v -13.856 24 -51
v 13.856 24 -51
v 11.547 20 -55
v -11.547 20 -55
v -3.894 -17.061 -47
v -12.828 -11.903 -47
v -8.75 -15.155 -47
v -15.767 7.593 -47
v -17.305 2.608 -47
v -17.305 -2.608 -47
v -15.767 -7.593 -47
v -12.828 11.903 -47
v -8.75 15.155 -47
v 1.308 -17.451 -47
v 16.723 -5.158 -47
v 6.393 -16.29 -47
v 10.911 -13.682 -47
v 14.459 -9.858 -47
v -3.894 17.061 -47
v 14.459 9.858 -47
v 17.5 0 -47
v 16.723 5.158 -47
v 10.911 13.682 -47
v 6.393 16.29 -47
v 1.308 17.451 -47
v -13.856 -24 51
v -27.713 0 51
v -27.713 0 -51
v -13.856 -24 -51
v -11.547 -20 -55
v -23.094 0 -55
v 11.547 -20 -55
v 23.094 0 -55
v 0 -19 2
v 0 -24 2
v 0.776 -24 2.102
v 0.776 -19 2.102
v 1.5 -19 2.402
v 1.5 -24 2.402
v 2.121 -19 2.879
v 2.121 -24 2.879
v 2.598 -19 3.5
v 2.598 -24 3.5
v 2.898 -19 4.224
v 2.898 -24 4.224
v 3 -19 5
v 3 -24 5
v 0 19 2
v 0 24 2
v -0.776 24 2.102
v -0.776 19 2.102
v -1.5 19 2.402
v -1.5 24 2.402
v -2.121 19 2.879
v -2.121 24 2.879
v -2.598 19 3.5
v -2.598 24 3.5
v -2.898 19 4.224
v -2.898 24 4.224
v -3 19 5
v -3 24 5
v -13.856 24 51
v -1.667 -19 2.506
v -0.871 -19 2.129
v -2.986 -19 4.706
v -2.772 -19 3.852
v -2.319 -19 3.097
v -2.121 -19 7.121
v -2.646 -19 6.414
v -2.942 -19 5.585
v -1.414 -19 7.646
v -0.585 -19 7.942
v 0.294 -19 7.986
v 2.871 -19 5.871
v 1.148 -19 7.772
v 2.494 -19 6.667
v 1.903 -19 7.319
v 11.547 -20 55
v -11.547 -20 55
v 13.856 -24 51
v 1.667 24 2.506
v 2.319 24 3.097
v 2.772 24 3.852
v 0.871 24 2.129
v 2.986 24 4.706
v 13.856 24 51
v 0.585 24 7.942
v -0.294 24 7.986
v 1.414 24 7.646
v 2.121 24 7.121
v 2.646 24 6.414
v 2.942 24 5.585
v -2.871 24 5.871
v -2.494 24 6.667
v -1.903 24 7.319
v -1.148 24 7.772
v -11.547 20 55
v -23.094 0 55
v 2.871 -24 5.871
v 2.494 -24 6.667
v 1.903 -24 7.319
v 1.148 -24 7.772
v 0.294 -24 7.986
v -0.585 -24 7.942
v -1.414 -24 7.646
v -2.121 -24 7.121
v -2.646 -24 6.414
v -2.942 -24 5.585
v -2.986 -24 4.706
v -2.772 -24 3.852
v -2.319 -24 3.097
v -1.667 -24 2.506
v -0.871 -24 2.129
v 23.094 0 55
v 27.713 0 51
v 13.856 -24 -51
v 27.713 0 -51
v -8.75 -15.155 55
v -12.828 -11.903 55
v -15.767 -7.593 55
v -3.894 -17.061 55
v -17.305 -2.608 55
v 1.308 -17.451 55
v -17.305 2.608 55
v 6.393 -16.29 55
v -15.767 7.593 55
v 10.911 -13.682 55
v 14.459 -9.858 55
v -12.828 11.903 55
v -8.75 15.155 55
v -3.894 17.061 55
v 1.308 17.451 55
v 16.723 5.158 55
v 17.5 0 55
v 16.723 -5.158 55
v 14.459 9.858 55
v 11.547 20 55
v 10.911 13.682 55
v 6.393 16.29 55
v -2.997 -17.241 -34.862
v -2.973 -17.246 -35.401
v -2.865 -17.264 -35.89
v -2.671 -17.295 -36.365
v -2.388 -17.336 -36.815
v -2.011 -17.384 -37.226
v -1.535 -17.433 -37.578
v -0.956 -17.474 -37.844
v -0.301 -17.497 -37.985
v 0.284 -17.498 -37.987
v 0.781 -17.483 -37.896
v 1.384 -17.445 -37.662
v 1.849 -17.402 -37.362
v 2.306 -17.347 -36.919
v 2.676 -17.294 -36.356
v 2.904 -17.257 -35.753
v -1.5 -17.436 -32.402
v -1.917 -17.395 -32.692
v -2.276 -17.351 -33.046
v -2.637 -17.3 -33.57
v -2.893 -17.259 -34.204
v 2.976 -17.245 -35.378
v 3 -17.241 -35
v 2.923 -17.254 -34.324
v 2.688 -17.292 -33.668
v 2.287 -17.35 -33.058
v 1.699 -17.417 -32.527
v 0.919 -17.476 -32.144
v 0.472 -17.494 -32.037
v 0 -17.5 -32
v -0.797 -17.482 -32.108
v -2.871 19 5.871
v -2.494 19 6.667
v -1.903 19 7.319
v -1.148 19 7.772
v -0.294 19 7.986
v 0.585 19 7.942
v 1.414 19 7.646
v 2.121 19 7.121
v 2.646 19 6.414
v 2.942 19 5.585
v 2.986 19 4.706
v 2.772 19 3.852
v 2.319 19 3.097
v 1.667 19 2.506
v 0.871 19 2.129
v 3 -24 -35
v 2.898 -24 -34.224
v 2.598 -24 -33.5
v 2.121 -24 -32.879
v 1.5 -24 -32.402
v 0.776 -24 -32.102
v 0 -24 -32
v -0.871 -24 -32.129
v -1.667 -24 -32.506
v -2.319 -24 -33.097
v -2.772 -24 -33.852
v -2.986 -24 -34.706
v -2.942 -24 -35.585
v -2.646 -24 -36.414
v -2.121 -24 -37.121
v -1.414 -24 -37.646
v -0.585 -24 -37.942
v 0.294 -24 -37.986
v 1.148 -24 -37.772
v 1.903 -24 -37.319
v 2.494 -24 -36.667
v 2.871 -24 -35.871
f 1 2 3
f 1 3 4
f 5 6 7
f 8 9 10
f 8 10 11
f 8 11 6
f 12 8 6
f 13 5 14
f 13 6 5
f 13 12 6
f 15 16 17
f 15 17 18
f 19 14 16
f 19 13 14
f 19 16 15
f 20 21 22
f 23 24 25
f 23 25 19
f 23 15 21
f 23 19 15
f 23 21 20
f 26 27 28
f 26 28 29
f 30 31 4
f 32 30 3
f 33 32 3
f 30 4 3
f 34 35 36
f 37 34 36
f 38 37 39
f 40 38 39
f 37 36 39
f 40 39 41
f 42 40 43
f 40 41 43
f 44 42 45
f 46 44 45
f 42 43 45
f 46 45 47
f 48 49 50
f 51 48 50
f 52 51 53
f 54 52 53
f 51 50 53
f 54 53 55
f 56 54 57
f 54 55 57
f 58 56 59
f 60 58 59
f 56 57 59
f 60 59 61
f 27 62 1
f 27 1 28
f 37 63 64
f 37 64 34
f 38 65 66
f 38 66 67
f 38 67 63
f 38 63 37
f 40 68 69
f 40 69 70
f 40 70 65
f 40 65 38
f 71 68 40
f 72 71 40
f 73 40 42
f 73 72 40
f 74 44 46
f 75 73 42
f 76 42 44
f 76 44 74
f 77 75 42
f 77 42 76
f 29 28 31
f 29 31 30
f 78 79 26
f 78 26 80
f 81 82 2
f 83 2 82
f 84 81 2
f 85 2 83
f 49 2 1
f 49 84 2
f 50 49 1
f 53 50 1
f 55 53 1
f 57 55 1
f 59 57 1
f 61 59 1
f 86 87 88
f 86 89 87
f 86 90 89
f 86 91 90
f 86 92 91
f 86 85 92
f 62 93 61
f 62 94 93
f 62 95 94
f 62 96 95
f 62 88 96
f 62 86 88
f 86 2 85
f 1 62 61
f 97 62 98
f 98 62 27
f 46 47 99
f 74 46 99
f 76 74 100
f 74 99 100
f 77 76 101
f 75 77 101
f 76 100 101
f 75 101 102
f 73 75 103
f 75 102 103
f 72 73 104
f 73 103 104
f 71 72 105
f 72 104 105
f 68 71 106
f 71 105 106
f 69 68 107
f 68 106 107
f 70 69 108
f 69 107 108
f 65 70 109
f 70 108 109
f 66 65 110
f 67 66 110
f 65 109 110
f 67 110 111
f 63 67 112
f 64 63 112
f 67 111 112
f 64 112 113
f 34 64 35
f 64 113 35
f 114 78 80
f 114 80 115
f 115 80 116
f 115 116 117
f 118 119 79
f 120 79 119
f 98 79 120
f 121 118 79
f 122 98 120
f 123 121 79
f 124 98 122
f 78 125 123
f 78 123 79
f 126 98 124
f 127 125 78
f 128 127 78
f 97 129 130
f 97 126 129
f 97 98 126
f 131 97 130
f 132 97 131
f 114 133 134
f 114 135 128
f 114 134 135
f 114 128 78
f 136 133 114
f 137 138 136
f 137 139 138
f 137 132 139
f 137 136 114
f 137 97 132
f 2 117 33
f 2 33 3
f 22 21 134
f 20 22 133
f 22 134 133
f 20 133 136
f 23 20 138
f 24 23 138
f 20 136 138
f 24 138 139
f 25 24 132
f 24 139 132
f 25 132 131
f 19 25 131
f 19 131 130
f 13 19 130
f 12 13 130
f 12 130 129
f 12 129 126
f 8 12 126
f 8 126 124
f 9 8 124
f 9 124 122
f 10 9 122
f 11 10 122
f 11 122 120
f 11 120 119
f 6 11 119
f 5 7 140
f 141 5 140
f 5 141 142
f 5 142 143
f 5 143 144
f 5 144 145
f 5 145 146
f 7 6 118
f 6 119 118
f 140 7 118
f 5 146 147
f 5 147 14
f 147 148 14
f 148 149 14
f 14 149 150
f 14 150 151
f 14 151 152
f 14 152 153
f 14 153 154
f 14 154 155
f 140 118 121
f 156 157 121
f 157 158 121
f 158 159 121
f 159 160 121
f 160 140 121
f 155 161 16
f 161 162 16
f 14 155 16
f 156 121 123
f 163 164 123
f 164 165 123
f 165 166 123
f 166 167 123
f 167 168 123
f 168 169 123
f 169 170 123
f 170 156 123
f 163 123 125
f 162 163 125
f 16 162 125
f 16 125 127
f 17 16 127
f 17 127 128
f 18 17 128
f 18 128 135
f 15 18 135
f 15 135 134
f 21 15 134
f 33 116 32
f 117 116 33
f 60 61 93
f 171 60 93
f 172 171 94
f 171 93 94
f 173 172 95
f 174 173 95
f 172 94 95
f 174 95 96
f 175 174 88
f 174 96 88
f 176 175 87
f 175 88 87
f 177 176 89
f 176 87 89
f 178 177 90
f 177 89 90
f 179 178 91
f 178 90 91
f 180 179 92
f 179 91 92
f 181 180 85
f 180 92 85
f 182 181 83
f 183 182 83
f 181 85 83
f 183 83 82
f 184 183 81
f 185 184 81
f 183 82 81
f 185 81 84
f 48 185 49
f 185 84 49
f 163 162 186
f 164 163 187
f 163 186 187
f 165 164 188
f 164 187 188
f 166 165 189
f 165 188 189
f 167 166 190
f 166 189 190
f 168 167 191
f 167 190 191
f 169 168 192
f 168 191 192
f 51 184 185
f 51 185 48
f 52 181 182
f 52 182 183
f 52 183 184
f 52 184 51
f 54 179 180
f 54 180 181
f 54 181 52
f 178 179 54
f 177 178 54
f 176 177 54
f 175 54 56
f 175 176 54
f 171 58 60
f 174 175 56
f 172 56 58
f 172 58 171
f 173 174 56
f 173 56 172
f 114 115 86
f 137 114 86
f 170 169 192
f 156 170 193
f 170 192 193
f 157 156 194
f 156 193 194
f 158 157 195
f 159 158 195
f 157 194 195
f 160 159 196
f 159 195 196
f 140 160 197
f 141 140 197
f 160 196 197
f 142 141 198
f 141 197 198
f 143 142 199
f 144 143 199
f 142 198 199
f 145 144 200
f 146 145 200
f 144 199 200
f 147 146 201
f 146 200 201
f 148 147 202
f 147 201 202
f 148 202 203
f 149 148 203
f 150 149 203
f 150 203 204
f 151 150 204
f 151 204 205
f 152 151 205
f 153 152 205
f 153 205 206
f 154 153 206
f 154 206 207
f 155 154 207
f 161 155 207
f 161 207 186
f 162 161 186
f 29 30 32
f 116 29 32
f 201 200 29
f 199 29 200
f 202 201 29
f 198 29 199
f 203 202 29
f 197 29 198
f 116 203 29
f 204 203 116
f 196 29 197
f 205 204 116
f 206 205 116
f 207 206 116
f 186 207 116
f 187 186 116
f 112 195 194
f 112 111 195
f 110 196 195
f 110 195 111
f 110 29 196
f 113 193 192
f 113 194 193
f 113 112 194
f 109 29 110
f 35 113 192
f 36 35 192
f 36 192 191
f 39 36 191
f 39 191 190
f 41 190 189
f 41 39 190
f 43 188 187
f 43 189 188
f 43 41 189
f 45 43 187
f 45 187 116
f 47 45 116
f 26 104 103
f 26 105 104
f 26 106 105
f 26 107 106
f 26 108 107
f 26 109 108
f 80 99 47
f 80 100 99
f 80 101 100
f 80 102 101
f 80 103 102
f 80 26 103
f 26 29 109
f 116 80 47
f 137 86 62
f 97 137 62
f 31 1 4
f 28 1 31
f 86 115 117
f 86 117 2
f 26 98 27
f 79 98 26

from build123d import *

# Parameters (mm, degrees)
F1_DEPTH = 55
F2_R     = 17.5
F3_DEPTH = 102
F5_DEPTH = 5
F7_DEPTH = 25
F9_DEPTH = 5
F10_SIZE = 4


with BuildPart() as f1:
    # F0 (on Top) → F1 (new body, symmetric)
    with BuildSketch(Plane.XY):
        Polygon((-13.856406, -24), (13.856406, -24), (27.712813, 0), (13.856406, 24), (-13.856406, 24), (-27.712813, 0), align=None)
    extrude(amount=F1_DEPTH, both=True)

    # F2 (on face) → F3 (cut)
    with BuildSketch(Plane.XY.offset(55)):
        Circle(F2_R)
    extrude(amount=-F3_DEPTH, mode=Mode.SUBTRACT)

    # F4 (on face) → F5 (cut)
    with BuildSketch(Plane(origin=(0, 24, 0), x_dir=(-1, 0, 0), z_dir=(0, 1, 0))):
        with BuildLine():
            ThreePointArc((0, 2), (2.12132, 2.87868), (3, 5))
            ThreePointArc((3, 5), (-2.12132, 7.12132), (0, 2))
        make_face()
    extrude(amount=-F5_DEPTH, mode=Mode.SUBTRACT)

    # F6 (on face) → F7 (cut)
    with BuildSketch(Plane.XZ.offset(24)):
        with BuildLine():
            ThreePointArc((3, -35), (2.12132, -32.87868), (0, -32))
            ThreePointArc((0, -32), (-2.12132, -37.12132), (3, -35))
        make_face()
        with BuildLine():
            ThreePointArc((0.502708, -35), (-0.355468, -35.355468), (0, -34.497292))
            ThreePointArc((0, -34.497292), (0.355468, -34.644532), (0.502708, -35))
        make_face(mode=Mode.SUBTRACT)
        with BuildLine():
            ThreePointArc((0.502708, -35), (0.355468, -34.644532), (0, -34.497292))
            ThreePointArc((0, -34.497292), (-0.355468, -35.355468), (0.502708, -35))
        make_face()
    extrude(amount=-F7_DEPTH, mode=Mode.SUBTRACT)

    # F8 (on face) → F9 (cut)
    with BuildSketch(Plane.XZ.offset(24)):
        with BuildLine():
            ThreePointArc((3, 5), (-2.12132, 7.12132), (0, 2))
            ThreePointArc((0, 2), (2.12132, 2.87868), (3, 5))
        make_face()
    extrude(amount=-F9_DEPTH, mode=Mode.SUBTRACT)

    # F10
    f10_edges = [f1.edges().sort_by_distance(p)[0] for p in [
        (-20.78461, -12, 55),
        (0, -24, 55),
        (0, 24, 55),
        (20.78461, 12, 55),
        (20.78461, -12, 55),
        (-20.78461, 12, 55),
        (-20.78461, -12, -55),
        (0, -24, -55),
        (20.78461, -12, -55),
        (20.78461, 12, -55),
        (0, 24, -55),
        (-20.78461, 12, -55),
    ]]
    chamfer(f10_edges, length=F10_SIZE)


solid = f1.part
